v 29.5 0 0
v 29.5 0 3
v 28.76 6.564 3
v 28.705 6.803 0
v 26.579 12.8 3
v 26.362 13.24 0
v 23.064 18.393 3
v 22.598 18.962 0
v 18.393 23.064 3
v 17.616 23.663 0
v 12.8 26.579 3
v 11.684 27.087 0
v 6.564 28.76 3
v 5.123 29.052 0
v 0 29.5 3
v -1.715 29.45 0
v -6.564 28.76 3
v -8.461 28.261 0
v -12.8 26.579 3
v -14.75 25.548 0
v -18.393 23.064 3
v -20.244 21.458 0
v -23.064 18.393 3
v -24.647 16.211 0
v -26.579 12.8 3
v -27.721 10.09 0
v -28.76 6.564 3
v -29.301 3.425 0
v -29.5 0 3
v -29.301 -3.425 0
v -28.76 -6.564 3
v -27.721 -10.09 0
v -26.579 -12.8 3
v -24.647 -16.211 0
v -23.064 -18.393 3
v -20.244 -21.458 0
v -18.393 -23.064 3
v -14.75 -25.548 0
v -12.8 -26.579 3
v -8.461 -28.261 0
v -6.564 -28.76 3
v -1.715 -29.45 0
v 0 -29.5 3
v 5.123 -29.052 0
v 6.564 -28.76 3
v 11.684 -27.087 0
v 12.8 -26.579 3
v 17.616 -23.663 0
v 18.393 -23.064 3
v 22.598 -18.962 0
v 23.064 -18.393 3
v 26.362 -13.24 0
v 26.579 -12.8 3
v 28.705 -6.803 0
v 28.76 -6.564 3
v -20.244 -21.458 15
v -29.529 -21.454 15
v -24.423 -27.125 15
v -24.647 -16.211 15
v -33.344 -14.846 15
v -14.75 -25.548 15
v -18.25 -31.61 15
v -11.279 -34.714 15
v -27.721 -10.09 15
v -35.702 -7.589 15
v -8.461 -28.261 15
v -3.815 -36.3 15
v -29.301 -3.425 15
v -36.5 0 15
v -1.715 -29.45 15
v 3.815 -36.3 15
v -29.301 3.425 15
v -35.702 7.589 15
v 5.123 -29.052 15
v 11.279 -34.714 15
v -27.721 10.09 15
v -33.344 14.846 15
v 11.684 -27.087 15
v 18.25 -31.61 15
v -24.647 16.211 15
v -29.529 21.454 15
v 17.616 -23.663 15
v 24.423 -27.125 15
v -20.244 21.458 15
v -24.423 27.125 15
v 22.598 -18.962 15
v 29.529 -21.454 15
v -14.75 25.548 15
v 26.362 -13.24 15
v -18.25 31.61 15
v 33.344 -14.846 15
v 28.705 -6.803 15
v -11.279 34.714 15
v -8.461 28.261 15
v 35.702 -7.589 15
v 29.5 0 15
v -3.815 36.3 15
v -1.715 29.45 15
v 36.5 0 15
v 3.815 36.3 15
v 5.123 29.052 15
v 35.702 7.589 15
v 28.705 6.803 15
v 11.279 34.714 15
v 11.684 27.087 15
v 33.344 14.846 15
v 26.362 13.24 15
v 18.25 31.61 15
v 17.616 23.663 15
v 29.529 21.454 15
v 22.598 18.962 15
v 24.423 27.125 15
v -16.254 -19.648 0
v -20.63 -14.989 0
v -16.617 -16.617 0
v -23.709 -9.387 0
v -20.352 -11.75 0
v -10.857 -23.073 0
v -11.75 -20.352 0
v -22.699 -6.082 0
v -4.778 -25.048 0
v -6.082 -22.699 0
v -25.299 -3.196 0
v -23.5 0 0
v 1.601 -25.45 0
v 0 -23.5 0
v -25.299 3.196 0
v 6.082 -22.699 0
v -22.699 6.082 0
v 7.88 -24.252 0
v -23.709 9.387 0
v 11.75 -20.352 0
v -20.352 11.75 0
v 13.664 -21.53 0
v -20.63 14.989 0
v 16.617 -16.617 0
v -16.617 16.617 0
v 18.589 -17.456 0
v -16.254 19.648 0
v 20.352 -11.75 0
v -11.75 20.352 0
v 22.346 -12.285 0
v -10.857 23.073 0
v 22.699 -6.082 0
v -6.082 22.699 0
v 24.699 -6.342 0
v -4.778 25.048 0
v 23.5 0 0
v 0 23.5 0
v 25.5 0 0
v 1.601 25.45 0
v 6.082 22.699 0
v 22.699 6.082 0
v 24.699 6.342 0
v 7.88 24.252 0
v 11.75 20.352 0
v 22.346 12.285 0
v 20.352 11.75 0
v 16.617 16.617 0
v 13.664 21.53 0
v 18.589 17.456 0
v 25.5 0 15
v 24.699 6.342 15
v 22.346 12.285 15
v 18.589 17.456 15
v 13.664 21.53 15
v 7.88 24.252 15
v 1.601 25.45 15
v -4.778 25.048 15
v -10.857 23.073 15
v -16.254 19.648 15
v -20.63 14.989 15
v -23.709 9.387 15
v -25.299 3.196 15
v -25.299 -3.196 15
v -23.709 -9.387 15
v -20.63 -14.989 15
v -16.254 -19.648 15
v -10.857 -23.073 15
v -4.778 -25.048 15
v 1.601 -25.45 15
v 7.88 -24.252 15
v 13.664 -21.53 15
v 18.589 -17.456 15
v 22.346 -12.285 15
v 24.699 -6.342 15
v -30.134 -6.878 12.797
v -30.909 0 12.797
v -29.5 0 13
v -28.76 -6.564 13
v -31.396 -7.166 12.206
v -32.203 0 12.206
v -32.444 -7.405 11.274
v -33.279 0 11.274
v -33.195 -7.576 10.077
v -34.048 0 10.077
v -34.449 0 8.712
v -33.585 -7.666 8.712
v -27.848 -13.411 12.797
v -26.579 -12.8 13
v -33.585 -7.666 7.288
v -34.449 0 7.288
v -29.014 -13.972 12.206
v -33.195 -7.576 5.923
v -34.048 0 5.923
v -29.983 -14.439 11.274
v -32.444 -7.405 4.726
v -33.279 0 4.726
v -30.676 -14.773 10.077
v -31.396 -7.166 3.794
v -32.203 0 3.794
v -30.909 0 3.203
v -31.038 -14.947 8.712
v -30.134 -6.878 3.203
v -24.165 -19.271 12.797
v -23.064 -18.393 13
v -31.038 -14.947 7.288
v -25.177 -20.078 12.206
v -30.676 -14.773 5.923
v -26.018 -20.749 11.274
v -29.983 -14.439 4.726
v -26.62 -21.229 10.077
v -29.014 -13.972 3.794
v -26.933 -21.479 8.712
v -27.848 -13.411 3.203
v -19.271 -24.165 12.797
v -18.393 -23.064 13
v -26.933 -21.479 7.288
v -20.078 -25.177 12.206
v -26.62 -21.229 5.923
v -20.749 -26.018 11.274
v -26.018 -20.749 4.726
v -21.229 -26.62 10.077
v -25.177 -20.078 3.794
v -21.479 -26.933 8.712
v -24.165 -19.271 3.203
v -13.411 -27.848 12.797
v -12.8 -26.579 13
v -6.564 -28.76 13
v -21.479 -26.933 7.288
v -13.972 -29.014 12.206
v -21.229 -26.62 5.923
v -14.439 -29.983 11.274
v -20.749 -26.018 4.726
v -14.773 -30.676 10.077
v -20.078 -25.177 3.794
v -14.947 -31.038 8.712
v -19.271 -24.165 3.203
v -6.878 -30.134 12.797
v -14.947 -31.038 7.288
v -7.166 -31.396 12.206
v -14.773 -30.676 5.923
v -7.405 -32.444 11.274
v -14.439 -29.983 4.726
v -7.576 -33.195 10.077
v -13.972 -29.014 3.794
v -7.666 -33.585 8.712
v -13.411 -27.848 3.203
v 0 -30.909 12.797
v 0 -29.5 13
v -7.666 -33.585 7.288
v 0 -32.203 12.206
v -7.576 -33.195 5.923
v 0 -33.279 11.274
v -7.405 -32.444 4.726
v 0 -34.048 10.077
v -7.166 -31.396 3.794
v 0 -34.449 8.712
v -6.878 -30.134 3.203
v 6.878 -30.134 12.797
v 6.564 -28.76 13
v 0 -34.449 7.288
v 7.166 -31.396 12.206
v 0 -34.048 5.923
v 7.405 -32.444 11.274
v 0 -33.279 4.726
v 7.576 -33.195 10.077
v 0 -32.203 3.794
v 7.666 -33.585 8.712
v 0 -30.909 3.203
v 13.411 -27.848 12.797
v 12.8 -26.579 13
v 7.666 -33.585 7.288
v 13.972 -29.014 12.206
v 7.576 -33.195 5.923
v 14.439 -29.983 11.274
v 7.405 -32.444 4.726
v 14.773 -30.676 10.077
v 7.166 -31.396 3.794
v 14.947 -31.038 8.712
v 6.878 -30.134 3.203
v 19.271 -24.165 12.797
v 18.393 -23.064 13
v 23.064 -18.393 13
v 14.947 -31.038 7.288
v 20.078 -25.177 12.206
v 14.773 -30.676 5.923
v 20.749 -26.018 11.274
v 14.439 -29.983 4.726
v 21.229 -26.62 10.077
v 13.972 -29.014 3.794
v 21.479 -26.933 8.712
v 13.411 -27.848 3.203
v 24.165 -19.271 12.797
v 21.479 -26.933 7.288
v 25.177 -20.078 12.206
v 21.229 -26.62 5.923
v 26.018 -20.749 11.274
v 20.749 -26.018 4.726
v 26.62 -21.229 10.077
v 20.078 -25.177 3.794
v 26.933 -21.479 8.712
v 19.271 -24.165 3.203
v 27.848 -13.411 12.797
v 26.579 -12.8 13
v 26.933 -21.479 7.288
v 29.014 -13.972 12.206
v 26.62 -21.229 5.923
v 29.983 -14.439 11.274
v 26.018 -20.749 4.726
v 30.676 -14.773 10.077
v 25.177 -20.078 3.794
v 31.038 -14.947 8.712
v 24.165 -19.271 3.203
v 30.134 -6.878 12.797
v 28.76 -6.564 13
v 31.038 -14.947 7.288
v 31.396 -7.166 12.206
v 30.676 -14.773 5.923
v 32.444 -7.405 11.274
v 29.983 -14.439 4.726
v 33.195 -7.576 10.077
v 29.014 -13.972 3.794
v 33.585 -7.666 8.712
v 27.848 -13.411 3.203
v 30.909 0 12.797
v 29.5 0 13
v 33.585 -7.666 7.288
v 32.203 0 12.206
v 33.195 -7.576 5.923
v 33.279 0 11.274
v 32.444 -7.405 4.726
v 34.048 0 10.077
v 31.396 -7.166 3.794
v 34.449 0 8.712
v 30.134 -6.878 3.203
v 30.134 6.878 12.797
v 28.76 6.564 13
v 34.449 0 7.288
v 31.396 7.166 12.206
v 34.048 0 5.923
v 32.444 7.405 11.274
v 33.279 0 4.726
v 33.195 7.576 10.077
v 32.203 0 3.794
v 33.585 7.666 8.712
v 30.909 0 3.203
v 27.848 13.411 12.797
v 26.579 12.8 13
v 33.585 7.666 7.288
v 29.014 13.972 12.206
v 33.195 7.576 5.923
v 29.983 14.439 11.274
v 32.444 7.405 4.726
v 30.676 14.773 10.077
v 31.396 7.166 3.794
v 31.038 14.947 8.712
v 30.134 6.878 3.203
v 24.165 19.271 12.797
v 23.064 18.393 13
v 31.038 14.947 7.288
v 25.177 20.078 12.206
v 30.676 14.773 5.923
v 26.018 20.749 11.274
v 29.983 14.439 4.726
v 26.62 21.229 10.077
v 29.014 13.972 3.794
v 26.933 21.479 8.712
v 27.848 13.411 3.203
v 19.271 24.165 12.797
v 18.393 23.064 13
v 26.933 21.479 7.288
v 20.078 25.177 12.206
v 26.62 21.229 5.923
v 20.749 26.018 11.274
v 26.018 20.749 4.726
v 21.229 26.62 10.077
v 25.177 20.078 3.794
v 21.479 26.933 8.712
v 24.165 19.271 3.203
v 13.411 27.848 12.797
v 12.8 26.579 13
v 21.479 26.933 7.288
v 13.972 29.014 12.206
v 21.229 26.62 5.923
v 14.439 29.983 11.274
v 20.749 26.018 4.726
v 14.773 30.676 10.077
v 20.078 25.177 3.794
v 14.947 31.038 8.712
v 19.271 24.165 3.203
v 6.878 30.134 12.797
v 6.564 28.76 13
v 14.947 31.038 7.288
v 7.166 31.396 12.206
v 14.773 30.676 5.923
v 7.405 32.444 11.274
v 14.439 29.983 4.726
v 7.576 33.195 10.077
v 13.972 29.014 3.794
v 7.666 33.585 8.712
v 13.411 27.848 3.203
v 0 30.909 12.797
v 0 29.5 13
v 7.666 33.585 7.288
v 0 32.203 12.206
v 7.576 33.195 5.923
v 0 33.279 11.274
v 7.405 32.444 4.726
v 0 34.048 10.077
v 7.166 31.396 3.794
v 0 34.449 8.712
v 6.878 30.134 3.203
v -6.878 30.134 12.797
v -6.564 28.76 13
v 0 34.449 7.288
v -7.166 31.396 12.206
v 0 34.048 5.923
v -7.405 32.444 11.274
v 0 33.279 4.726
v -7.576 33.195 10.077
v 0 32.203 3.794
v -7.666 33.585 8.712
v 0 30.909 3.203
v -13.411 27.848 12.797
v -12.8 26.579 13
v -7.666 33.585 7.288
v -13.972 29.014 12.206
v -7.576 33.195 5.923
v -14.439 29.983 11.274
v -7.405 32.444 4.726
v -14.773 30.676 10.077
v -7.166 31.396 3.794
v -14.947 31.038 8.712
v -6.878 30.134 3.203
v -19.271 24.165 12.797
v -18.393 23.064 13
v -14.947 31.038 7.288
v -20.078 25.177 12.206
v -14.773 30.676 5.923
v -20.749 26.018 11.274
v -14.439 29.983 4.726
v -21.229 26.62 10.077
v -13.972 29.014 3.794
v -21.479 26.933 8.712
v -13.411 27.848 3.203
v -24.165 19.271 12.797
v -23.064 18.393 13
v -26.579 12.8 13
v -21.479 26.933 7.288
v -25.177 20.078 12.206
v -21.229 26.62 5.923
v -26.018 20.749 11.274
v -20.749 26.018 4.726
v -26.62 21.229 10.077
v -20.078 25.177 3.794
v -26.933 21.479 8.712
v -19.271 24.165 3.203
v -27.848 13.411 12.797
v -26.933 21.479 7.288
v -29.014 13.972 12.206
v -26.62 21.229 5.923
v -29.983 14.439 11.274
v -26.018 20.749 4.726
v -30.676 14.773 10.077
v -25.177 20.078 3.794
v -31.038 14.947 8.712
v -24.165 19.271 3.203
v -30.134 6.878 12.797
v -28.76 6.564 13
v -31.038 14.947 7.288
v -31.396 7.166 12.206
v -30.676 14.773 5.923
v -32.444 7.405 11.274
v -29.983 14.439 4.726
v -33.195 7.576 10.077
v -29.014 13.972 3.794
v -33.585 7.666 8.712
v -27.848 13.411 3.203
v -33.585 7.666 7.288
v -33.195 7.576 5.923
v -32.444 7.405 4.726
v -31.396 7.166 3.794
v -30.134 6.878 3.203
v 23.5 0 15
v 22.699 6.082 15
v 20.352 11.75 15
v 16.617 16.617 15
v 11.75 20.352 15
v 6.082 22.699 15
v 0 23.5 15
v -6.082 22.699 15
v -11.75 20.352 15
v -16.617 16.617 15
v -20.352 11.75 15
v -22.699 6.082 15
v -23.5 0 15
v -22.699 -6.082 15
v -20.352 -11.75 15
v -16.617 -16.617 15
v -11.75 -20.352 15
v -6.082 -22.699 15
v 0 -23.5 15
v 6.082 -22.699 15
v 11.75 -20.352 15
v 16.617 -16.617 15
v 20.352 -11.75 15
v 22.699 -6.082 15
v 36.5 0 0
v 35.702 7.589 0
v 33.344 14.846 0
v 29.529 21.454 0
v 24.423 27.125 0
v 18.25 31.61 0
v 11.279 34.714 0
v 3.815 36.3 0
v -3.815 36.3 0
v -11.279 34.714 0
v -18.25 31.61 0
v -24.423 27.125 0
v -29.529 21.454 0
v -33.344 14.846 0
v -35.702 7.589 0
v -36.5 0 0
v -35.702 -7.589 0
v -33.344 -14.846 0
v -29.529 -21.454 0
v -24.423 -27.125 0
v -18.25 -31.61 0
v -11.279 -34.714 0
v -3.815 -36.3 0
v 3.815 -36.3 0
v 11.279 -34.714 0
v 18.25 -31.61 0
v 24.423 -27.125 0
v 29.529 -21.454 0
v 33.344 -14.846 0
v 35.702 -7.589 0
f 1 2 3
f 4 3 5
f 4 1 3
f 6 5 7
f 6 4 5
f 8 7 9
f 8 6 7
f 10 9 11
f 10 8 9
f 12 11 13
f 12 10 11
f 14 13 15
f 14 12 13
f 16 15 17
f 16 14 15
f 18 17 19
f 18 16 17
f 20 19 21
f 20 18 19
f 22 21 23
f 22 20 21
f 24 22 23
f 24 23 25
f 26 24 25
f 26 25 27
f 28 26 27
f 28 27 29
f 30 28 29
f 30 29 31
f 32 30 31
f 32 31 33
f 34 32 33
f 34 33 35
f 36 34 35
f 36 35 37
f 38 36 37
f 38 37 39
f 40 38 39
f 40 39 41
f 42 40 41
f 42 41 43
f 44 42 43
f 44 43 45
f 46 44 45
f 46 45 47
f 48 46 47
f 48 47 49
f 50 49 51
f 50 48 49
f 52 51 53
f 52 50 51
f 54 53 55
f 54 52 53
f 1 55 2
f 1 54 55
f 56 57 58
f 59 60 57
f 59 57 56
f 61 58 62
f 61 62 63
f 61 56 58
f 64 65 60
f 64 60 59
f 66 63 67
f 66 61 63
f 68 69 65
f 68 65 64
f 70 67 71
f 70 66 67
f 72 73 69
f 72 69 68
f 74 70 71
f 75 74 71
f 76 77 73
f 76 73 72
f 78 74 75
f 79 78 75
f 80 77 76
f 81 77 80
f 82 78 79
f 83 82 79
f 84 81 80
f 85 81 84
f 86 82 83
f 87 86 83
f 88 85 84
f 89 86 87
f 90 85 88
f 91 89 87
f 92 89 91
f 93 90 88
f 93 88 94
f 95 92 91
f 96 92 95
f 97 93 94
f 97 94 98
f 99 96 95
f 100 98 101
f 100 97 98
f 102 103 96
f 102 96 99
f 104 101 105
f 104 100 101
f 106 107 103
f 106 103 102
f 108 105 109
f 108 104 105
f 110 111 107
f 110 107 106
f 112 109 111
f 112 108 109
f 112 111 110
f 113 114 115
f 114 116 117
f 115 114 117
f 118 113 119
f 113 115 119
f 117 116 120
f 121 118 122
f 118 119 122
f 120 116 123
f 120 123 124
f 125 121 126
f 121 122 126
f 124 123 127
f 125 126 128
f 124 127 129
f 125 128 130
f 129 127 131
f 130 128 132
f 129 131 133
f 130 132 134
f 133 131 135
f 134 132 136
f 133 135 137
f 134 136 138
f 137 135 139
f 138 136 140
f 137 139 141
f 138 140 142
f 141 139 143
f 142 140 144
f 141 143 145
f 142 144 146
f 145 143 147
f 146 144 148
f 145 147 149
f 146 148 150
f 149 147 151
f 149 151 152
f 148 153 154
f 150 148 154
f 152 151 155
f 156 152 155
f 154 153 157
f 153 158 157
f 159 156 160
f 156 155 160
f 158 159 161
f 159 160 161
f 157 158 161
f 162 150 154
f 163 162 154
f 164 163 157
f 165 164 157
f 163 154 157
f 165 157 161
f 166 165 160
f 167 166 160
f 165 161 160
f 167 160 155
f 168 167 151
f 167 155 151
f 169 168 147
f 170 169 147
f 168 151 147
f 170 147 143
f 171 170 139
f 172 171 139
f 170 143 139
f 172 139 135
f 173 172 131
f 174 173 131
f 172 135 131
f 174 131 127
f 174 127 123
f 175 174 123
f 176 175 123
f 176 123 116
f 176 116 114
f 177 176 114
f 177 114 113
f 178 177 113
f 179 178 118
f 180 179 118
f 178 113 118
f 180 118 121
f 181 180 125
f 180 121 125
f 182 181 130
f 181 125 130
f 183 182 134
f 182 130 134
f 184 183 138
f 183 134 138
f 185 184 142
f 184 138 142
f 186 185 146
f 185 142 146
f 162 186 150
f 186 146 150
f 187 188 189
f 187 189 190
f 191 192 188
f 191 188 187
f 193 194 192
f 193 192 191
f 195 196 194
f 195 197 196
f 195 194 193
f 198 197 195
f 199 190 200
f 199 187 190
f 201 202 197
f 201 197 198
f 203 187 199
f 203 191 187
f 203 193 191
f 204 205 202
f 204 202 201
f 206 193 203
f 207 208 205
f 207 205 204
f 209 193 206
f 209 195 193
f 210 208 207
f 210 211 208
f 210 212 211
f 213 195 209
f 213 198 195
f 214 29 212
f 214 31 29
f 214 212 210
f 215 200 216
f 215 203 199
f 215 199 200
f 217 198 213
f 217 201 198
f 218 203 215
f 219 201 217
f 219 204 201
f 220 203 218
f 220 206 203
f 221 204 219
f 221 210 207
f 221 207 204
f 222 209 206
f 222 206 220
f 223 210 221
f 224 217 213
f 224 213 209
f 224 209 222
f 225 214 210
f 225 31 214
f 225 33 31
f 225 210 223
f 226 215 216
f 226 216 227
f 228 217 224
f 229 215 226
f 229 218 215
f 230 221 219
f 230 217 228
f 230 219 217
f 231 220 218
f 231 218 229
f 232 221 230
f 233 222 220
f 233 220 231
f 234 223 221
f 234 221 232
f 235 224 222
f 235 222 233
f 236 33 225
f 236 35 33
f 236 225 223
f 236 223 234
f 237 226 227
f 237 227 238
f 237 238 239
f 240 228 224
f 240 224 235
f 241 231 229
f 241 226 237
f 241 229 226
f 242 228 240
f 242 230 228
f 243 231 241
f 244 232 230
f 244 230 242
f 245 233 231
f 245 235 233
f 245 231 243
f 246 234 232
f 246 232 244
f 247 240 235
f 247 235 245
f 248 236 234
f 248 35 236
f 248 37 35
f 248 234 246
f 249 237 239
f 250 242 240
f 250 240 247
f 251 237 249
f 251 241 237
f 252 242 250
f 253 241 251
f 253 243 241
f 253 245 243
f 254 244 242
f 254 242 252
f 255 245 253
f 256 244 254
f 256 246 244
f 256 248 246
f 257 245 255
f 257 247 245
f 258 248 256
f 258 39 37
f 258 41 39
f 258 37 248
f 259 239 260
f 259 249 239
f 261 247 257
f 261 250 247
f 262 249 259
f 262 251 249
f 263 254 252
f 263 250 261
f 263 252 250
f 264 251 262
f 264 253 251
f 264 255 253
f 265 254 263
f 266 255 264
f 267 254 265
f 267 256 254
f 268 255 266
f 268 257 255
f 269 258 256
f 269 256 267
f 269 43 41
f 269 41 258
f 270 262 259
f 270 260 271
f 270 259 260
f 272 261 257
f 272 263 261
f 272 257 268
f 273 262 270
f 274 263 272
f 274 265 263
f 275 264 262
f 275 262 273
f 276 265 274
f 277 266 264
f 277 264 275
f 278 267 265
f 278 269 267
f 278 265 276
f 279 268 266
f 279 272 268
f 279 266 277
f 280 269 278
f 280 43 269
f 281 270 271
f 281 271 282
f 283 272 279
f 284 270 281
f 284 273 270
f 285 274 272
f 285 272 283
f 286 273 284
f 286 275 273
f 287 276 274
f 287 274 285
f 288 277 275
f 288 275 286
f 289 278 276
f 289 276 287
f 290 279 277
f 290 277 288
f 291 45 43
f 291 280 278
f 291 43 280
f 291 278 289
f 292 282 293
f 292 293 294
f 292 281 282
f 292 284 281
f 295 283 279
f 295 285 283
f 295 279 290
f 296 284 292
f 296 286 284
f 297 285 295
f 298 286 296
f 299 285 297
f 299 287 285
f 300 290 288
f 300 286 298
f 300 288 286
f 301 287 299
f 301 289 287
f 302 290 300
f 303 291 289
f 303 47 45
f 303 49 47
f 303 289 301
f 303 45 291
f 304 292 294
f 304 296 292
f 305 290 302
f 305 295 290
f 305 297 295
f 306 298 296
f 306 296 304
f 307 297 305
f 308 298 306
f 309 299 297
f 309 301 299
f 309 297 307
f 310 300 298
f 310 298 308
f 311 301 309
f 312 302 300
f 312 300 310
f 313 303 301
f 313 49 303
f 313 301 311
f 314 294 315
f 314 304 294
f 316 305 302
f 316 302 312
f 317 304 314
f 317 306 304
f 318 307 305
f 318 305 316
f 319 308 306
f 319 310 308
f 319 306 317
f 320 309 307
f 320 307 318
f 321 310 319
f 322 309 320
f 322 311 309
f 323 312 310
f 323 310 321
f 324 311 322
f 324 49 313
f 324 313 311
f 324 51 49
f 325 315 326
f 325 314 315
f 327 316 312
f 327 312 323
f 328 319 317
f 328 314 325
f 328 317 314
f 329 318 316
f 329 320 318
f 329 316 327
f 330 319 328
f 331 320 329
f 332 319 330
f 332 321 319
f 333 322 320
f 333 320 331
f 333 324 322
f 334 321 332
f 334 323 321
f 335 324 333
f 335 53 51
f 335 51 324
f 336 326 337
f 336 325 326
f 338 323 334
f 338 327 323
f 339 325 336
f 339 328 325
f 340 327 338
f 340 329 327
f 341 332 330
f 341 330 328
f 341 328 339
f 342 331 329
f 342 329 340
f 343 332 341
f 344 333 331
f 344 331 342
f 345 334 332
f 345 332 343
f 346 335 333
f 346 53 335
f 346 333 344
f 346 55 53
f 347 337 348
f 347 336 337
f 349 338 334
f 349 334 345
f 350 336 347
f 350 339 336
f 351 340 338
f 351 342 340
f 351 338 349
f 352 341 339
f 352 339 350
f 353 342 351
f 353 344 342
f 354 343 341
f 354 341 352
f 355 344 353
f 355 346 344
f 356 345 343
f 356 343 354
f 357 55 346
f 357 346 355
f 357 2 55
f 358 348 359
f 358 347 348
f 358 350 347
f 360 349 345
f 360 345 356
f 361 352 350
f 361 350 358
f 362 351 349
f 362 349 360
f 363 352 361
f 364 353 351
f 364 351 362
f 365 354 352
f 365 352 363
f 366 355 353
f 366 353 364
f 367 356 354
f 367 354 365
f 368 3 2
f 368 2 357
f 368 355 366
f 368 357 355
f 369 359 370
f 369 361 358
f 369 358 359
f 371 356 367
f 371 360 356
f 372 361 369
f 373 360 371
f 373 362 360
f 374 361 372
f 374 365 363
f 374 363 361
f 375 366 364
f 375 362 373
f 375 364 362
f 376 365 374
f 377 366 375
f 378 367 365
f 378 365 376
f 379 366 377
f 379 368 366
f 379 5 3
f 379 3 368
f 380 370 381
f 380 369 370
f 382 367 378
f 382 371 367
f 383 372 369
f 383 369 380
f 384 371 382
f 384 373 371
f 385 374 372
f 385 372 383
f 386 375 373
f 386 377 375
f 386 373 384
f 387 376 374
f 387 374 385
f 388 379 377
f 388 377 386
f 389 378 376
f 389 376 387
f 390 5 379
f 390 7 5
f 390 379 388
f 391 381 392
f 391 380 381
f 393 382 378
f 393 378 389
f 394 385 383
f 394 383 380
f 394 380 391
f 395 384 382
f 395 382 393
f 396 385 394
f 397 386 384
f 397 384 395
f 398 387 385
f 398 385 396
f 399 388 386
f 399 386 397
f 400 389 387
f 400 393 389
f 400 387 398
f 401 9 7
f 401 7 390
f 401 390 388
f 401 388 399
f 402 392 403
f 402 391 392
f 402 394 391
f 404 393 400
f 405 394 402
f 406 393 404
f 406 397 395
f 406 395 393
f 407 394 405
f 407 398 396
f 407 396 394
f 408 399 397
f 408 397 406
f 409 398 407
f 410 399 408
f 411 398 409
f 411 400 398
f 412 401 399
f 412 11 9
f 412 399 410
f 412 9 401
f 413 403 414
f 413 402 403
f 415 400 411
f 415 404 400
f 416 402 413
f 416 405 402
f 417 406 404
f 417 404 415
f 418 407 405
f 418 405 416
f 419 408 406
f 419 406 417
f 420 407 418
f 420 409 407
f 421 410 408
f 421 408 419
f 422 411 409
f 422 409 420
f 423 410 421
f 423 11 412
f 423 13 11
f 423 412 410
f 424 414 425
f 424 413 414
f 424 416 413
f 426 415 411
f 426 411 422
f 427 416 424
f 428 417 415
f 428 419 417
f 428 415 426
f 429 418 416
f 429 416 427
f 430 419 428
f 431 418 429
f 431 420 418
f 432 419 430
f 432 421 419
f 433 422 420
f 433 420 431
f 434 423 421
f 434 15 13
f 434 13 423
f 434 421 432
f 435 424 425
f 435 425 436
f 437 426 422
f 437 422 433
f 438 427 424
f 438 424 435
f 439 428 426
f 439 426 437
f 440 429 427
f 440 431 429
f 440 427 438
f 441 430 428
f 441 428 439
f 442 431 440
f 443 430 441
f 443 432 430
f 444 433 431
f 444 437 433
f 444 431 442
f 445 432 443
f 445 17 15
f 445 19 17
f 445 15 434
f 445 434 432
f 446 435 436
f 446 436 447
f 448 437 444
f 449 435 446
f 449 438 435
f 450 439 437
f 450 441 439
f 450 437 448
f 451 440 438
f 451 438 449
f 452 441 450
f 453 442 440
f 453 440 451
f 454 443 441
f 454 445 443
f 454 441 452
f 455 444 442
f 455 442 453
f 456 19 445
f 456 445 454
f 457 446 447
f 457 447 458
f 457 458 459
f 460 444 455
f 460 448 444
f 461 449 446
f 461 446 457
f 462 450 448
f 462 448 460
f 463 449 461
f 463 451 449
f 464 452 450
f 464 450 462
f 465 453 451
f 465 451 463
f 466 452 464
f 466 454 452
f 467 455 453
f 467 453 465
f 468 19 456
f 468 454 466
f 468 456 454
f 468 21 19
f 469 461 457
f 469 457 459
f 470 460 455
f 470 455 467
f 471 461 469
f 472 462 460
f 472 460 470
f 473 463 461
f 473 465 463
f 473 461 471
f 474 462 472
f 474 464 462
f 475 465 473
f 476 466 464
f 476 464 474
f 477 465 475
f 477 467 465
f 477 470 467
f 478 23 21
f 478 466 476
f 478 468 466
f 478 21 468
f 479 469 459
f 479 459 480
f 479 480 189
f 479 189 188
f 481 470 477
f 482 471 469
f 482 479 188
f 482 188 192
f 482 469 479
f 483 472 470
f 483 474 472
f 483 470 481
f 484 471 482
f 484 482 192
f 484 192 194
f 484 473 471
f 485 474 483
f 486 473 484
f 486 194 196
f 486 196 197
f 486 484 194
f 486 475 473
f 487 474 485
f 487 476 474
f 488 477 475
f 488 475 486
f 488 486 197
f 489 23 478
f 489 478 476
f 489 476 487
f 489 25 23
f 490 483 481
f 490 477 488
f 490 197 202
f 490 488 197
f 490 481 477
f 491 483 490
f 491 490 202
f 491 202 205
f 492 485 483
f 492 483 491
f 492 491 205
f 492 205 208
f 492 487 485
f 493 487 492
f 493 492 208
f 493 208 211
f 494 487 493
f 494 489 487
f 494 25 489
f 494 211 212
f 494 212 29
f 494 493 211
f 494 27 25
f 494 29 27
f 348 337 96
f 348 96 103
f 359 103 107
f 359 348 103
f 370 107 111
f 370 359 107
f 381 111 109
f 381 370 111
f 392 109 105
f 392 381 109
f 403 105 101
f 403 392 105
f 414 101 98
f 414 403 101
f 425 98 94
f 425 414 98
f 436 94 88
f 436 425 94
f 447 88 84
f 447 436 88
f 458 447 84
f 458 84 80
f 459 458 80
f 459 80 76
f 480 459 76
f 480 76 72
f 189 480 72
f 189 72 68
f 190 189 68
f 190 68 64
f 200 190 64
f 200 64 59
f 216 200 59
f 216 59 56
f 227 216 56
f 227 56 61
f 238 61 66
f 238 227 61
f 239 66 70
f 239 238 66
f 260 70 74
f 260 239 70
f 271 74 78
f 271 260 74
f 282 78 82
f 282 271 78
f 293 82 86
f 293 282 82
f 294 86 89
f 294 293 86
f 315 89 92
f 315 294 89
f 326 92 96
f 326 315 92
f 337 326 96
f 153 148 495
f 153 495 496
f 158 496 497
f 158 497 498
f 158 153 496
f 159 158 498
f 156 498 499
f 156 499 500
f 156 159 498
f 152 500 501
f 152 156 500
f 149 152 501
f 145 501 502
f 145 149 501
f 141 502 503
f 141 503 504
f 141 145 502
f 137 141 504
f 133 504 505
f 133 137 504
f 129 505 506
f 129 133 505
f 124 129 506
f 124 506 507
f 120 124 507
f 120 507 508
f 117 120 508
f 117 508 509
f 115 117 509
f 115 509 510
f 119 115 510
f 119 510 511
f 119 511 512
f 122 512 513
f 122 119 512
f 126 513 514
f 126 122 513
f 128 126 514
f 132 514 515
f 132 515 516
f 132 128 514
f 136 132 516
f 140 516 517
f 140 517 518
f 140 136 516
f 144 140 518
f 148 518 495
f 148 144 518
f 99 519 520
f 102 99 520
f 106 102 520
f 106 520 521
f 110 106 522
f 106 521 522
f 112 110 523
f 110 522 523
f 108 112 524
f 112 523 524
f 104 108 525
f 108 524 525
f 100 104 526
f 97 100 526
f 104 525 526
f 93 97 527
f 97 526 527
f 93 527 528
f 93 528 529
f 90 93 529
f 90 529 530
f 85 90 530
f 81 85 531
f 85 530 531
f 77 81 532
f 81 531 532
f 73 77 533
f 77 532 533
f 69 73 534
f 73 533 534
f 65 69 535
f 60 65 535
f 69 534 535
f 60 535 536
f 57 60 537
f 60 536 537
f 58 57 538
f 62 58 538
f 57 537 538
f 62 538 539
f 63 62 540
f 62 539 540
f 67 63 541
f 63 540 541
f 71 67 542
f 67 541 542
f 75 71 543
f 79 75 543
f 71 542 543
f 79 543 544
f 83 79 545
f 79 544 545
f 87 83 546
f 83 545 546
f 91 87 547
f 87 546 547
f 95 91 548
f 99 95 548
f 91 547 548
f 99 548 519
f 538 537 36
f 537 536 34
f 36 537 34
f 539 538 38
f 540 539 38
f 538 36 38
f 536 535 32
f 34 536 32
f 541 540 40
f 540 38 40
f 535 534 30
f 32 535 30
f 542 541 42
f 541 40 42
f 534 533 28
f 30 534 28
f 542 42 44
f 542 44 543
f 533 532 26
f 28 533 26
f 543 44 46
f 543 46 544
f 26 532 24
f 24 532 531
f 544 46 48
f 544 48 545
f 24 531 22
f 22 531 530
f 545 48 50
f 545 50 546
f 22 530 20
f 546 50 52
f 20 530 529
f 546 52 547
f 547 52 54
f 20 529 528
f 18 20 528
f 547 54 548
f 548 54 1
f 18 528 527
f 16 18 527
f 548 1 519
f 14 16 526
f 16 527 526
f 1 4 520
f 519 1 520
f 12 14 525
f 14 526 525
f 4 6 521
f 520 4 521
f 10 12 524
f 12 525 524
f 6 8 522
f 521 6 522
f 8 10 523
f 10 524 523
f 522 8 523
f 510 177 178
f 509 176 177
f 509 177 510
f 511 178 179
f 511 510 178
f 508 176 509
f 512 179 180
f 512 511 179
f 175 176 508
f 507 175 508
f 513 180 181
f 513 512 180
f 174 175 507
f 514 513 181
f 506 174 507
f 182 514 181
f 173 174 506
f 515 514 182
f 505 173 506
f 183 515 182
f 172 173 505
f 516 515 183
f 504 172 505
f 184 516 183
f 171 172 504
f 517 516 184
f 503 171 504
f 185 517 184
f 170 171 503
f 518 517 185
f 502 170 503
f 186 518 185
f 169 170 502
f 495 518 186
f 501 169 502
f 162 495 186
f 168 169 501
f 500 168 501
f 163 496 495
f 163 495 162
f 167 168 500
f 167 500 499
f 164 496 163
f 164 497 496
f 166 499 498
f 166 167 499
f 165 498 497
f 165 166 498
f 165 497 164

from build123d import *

# Parameters (mm, degrees)
SKETCH_1_R      = 25.5
SKETCH_1_R_2    = 23.5
EXTRUDE_2_DEPTH = 15
SKETCH_3_R      = 36.5
SKETCH_3_R_2    = 29.5
EXTRUDE_3_DEPTH = 15


with BuildPart() as part:
    # 草图1 → 凸台-拉伸2 (new body)
    with BuildSketch(Plane.XY):
        Circle(SKETCH_1_R)
        Circle(SKETCH_1_R_2, mode=Mode.SUBTRACT)
    extrude(amount=EXTRUDE_2_DEPTH)


with BuildPart() as body_2:
    # 草图3 → 凸台-拉伸3 (new body)
    with BuildSketch(Plane.XY):
        Circle(SKETCH_3_R)
        Circle(SKETCH_3_R_2, mode=Mode.SUBTRACT)
    extrude(amount=EXTRUDE_3_DEPTH)

    # 草图5 → 切除-旋转2 (revolve, cut)
    with BuildSketch(Plane(origin=(0, 0, 0), x_dir=(1, 0, 0), z_dir=(0, 1, 0))):
        with BuildLine():
            Line((-29.5, -3), (-29.5, -13))
            ThreePointArc((-29.5, -13), (-34.5, -8), (-29.5, -3))
        make_face()
    revolve(axis=Axis((0, 0, 0), (0, 0, 1)), mode=Mode.SUBTRACT)


solid = Compound([part.part, body_2.part])
